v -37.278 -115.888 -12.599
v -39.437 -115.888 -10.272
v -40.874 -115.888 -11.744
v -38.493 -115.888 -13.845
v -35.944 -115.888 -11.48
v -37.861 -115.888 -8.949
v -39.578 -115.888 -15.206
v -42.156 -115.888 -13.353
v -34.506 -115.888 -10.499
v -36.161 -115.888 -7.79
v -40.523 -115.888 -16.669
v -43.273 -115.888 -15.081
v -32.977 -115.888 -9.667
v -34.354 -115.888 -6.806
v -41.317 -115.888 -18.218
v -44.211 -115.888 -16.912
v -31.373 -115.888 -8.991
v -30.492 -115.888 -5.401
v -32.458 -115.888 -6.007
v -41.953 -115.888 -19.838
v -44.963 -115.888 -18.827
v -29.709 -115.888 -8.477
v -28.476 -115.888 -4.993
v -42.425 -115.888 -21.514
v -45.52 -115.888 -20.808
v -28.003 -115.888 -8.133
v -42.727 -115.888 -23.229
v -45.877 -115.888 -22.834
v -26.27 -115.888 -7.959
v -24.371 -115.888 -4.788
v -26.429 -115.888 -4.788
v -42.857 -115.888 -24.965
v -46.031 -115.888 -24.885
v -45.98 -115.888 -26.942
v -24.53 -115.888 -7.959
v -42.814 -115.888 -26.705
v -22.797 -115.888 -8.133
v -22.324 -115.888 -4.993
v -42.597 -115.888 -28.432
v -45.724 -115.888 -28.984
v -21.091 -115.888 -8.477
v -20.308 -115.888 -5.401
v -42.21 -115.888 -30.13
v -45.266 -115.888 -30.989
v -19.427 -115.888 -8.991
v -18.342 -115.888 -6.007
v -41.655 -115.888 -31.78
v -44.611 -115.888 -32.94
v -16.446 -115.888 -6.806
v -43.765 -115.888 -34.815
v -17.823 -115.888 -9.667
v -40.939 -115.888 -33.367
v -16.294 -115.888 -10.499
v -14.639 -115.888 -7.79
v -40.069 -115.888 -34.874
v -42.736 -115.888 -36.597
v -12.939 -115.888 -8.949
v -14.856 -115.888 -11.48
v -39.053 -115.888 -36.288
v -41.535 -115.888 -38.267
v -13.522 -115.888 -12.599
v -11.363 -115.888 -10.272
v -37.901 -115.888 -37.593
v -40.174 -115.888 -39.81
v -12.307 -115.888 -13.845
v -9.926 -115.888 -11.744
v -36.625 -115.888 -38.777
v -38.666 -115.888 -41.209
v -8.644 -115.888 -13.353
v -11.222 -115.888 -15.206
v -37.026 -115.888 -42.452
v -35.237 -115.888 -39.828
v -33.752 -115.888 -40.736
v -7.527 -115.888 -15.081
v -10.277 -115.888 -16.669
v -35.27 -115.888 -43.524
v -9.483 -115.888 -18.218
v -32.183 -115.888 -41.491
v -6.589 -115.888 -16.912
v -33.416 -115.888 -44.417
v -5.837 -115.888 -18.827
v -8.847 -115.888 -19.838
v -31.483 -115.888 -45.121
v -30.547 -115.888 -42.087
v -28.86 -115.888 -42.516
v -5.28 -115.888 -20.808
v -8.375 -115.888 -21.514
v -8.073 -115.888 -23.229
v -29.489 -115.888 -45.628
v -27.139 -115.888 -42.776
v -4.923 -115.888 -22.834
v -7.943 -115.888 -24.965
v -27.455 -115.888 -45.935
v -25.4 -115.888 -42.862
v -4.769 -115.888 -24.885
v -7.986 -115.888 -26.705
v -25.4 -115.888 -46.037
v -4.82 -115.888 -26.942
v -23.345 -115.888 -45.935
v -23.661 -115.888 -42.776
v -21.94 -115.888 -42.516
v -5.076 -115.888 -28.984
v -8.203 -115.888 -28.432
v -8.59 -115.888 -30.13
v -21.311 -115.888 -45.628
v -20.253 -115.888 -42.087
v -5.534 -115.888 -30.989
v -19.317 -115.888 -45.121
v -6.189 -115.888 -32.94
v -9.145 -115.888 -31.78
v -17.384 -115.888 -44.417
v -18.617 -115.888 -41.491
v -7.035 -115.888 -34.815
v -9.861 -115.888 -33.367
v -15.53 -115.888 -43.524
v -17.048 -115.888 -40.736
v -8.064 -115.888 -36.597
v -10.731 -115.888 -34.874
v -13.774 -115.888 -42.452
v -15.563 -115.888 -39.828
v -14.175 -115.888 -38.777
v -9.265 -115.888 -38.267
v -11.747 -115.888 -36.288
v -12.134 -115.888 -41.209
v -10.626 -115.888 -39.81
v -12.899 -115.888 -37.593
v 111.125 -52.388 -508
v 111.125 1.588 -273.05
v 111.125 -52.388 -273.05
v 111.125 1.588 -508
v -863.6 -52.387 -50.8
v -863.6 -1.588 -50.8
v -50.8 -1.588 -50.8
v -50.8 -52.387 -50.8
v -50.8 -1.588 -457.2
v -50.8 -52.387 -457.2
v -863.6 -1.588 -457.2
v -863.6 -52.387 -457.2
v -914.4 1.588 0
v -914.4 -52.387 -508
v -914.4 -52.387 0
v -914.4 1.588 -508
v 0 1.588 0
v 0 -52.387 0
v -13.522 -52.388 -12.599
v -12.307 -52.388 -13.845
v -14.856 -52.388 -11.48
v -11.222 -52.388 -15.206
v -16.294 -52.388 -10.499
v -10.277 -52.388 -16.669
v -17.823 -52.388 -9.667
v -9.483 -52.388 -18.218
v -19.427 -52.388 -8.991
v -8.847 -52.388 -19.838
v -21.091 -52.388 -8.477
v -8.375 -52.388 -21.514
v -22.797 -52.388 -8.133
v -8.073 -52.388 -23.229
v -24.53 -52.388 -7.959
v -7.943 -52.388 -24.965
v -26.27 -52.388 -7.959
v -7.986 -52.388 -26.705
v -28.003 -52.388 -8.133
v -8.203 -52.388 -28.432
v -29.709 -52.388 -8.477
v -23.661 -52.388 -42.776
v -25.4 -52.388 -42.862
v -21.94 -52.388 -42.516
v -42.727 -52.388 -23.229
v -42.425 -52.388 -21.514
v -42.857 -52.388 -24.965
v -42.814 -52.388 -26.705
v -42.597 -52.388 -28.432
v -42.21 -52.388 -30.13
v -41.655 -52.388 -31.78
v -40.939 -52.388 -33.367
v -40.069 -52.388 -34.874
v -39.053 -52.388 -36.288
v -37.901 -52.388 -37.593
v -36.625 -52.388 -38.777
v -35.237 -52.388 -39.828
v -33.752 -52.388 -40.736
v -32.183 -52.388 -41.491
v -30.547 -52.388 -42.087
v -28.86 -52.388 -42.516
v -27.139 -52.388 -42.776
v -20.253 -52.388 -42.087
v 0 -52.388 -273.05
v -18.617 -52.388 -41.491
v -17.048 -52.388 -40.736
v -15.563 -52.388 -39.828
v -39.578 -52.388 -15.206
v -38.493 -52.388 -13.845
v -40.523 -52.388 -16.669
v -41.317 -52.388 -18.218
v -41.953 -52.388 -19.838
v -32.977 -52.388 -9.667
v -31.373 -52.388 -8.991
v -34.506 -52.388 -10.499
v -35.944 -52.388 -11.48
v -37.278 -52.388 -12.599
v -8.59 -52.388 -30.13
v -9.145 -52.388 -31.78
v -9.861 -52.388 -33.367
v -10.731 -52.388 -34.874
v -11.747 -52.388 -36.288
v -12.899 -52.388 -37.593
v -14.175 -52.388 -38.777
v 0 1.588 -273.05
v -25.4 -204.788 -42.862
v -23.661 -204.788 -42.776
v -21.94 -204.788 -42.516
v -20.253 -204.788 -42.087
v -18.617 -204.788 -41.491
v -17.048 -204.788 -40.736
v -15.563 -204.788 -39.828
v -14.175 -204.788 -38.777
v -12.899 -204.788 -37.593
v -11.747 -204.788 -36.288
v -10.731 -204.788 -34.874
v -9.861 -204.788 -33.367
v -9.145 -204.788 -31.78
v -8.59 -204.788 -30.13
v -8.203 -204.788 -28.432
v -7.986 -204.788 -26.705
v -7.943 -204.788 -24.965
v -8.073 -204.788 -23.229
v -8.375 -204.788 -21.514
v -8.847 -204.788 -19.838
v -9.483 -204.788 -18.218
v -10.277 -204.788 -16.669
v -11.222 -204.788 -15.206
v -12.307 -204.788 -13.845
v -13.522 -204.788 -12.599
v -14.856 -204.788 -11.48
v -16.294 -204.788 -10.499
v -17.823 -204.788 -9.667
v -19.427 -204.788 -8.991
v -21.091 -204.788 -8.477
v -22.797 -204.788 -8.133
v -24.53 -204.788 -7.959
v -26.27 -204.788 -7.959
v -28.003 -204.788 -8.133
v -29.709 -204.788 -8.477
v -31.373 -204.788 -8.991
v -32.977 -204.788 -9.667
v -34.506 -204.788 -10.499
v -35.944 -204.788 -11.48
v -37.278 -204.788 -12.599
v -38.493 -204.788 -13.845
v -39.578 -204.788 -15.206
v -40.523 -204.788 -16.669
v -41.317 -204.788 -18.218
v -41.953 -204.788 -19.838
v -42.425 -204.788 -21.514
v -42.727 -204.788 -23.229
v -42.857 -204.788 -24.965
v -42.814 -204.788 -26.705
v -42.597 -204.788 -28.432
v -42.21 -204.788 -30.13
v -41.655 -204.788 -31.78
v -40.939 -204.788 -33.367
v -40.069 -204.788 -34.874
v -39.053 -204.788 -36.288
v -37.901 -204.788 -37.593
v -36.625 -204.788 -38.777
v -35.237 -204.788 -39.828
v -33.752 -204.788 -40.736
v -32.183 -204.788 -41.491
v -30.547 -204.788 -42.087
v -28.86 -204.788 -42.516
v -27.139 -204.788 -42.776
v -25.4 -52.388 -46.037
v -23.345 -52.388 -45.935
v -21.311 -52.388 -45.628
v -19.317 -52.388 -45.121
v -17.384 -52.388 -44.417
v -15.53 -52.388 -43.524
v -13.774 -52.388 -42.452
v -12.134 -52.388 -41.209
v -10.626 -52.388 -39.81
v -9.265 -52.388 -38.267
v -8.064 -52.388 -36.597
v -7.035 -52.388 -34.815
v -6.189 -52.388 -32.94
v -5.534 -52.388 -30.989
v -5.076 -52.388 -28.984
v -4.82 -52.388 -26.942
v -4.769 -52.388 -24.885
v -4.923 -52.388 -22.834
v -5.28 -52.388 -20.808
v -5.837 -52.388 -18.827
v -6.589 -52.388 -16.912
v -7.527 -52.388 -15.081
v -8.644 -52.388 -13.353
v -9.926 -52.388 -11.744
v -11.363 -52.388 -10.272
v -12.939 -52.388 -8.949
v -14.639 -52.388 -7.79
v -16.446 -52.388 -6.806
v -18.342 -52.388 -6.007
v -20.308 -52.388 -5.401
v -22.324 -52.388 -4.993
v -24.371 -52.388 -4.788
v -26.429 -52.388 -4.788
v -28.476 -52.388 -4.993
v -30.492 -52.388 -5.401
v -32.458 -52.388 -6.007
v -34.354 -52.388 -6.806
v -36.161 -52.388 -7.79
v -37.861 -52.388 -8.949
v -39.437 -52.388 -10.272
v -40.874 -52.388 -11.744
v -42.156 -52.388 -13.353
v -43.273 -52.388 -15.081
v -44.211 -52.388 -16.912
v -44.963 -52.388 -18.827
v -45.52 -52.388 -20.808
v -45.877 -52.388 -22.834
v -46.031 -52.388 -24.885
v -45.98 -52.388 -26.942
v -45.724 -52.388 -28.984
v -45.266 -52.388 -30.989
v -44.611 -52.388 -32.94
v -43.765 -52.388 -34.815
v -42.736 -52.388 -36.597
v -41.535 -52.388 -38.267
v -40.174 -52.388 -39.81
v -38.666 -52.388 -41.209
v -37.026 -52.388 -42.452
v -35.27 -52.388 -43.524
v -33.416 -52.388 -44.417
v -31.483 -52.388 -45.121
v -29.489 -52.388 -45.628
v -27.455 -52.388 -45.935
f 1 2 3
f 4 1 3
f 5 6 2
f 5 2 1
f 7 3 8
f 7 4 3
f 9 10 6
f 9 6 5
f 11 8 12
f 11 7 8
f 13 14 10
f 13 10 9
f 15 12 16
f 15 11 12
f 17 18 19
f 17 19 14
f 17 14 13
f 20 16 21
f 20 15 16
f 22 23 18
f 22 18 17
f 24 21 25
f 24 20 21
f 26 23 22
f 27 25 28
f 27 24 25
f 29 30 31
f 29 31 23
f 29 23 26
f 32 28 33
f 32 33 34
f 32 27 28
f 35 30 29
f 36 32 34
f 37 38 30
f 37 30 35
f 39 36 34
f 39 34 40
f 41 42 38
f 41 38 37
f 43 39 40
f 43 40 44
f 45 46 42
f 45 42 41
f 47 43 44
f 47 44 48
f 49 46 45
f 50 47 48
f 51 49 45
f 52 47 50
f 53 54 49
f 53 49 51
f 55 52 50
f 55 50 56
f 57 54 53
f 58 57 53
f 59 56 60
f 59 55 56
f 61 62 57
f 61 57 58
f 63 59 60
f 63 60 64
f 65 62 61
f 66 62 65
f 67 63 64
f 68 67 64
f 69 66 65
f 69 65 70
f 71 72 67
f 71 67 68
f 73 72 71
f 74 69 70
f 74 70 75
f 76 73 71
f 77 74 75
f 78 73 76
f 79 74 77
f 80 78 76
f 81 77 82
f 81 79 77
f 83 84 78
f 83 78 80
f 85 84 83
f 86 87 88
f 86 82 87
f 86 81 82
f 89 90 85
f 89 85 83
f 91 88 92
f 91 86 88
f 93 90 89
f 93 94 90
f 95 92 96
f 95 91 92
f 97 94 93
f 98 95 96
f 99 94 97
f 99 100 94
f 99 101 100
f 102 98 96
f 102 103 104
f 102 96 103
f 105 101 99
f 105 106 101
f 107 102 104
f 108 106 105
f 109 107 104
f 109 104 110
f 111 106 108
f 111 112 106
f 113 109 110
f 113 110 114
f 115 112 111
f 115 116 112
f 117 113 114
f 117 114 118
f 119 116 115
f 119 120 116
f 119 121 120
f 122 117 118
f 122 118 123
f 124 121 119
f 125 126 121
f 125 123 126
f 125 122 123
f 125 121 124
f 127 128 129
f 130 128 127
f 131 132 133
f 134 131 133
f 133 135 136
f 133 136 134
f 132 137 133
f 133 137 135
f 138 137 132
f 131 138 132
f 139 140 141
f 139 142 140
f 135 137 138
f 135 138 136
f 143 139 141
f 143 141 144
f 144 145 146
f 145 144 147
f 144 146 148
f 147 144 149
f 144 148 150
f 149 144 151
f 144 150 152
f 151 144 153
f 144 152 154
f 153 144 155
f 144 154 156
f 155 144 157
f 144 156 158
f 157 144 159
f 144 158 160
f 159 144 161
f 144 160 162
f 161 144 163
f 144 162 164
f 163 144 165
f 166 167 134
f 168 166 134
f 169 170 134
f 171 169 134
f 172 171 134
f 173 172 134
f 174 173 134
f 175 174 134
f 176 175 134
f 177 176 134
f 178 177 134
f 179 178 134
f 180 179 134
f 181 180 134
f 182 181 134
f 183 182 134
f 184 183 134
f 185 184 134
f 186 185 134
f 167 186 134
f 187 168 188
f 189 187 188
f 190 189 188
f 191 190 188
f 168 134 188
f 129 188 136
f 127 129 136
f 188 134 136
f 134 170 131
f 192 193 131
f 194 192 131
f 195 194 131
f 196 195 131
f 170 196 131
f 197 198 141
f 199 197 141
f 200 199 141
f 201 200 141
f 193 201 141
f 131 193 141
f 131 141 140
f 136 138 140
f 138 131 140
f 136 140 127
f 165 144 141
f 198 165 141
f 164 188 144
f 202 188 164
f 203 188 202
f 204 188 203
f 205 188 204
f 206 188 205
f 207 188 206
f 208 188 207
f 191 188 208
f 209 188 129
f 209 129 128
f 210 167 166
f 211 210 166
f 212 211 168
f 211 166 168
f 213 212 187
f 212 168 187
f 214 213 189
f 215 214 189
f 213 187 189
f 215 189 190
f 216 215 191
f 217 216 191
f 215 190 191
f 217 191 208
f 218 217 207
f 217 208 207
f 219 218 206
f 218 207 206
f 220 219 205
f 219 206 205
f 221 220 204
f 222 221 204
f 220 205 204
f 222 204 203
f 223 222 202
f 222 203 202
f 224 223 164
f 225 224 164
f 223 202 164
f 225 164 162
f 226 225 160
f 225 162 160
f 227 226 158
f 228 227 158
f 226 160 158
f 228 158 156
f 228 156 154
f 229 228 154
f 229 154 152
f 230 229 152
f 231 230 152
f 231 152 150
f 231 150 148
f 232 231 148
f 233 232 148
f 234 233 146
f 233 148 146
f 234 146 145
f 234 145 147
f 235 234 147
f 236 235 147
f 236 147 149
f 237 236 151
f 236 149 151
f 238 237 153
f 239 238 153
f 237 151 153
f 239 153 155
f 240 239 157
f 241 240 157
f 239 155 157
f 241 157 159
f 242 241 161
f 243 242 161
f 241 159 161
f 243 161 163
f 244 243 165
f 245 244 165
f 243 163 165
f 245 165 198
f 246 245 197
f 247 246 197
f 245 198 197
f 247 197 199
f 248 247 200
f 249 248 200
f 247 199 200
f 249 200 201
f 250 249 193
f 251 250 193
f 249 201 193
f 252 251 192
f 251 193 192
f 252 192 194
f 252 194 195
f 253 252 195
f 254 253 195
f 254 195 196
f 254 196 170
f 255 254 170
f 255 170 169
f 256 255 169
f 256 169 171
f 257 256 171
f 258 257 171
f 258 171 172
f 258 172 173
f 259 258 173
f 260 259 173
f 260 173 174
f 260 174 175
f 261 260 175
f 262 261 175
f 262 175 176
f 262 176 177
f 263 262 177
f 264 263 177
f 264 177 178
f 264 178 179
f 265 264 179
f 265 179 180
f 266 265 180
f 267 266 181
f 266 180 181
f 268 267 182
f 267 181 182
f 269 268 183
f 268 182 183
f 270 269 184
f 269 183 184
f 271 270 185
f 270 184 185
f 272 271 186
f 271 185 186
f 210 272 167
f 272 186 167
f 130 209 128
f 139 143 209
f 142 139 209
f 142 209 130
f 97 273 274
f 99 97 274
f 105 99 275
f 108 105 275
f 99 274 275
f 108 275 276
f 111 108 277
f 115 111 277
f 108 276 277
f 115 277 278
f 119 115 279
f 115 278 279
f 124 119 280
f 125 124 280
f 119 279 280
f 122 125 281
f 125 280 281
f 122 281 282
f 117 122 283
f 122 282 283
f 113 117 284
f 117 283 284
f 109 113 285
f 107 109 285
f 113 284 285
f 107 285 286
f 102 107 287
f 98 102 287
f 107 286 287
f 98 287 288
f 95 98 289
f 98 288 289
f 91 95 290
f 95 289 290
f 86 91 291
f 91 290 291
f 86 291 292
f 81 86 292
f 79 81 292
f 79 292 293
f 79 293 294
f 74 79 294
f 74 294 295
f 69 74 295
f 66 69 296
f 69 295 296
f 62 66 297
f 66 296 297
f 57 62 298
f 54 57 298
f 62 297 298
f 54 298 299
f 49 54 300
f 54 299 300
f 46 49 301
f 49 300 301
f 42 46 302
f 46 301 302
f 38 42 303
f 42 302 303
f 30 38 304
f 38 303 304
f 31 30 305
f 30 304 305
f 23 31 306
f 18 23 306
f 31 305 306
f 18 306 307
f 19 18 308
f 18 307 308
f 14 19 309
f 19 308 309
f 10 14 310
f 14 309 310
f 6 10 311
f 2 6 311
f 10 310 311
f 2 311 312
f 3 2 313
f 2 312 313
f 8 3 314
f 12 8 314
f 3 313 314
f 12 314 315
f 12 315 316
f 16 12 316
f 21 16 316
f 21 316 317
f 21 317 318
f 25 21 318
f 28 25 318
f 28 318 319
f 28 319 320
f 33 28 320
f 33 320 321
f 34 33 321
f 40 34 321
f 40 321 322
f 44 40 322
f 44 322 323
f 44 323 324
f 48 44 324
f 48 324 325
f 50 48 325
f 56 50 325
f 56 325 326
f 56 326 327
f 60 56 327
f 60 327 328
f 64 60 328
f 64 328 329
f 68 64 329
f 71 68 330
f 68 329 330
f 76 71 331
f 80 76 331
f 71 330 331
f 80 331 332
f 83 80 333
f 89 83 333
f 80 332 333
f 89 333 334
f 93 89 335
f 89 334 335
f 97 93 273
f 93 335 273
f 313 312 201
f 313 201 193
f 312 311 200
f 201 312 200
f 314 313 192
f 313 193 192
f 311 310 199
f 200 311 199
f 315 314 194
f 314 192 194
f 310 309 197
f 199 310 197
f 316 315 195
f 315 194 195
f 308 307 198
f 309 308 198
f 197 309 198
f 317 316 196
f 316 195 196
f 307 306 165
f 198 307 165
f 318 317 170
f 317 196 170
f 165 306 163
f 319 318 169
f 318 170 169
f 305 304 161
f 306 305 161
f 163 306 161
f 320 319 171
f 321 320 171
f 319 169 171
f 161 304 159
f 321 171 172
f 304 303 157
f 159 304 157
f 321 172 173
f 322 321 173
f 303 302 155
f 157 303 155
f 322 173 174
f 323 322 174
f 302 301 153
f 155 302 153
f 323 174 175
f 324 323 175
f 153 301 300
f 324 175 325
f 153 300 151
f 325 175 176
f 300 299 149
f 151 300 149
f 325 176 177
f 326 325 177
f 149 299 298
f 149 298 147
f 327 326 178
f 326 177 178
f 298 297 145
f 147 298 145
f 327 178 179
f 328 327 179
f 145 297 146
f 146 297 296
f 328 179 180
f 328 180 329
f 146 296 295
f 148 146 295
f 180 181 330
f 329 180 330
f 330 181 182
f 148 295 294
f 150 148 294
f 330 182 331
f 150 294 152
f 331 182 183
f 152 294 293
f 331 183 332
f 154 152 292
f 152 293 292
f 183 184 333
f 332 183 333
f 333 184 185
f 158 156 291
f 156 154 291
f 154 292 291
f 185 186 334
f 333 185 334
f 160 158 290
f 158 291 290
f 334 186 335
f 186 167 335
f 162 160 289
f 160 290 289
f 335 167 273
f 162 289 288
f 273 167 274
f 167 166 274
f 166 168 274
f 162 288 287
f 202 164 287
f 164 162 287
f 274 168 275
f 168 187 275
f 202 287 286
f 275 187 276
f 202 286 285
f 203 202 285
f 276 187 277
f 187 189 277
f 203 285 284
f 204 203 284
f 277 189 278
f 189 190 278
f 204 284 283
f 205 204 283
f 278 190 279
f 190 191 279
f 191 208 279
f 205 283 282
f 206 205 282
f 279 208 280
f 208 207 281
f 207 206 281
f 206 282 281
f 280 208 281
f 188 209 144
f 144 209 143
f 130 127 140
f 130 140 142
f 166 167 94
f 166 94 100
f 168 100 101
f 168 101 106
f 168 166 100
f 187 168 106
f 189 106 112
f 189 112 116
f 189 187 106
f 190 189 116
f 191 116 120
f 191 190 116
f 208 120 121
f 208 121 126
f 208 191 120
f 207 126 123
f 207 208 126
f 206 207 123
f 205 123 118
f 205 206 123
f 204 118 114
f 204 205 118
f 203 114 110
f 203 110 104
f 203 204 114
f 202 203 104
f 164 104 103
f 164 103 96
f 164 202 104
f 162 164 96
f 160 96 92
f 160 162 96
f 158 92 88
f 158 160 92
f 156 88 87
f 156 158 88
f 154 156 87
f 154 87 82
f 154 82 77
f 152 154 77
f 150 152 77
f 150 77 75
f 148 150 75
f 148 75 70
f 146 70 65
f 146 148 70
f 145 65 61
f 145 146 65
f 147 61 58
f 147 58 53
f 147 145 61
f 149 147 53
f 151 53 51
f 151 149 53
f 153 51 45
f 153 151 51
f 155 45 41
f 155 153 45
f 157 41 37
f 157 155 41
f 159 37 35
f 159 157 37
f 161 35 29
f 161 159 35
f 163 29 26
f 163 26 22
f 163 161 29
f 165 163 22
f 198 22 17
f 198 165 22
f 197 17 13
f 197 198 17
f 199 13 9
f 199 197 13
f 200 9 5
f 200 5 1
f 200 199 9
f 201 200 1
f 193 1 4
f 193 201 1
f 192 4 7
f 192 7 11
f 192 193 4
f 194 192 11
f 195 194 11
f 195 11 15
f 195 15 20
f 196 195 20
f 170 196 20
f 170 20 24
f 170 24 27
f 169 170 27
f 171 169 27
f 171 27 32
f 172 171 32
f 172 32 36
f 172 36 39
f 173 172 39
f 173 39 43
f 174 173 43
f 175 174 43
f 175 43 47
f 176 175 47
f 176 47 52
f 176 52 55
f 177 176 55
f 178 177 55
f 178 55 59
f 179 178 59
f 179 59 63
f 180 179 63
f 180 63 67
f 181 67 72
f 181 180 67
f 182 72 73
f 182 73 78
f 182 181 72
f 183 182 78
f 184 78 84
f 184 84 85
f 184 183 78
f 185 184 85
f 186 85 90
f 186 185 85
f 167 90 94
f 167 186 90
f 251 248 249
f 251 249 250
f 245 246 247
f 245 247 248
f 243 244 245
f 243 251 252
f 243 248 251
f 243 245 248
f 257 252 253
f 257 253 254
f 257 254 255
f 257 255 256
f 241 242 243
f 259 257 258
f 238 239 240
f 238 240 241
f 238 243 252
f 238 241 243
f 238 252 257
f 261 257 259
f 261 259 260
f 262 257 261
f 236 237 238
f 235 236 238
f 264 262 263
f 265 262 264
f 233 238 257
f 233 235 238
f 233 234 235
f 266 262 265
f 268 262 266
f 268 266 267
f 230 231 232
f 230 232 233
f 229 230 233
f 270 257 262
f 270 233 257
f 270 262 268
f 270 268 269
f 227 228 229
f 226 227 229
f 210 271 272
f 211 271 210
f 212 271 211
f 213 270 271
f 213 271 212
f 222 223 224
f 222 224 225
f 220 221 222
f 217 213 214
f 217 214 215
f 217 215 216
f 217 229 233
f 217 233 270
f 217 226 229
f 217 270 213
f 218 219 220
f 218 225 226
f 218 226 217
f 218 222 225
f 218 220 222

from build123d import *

# Parameters (mm, degrees)
SKETCH1_W           = 914.4
SKETCH1_H           = 508
BOSS_EXTRUDE1_DEPTH = 1.5875
SKETCH2_W           = 914.4
SKETCH2_H           = 508
SKETCH2_W_2         = 812.8
SKETCH2_H_2         = 406.4
BOSS_EXTRUDE2_DEPTH = 50.8
SKETCH3_R           = 17.4625
BOSS_EXTRUDE3_DEPTH = 152.4
SKETCH4_R           = 20.6375
SKETCH4_R_2         = 17.4625
BOSS_EXTRUDE4_DEPTH = 63.5
SKETCH5_W           = 234.95
SKETCH5_H           = 53.975
BOSS_EXTRUDE5_DEPTH = 111.125


with BuildPart() as part:
    # Sketch1 → Boss-Extrude1 (new body, symmetric)
    with BuildSketch(Plane(origin=(0, 0, 0), x_dir=(1, 0, 0), z_dir=(0, 1, 0))):
        with Locations((-457.2, 254)):
            Rectangle(SKETCH1_W, SKETCH1_H)
    extrude(amount=BOSS_EXTRUDE1_DEPTH, both=True)

    # Sketch2 → Boss-Extrude2 (add)
    with BuildSketch(Plane.XZ.offset(1.5875)):
        with Locations((-457.2, -254)):
            Rectangle(SKETCH2_W, SKETCH2_H)
        with Locations((-457.2, -254)):
            Rectangle(SKETCH2_W_2, SKETCH2_H_2, mode=Mode.SUBTRACT)
    extrude(amount=BOSS_EXTRUDE2_DEPTH)

    # Sketch3 → Boss-Extrude3 (add)
    with BuildSketch(Plane.XZ.offset(52.3875)):
        with Locations(Location((-25.4, -25.4, 0), (0, 0, 270))):  # turned: the seam where the file's is
            Circle(SKETCH3_R)
    extrude(amount=BOSS_EXTRUDE3_DEPTH)

    # Sketch5 → Boss-Extrude5 (add)
    with BuildSketch(Plane(origin=(0, 0, 0), x_dir=(0, 0, -1), z_dir=(1, 0, 0))):
        with Locations((390.525, -25.4)):
            Rectangle(SKETCH5_W, SKETCH5_H)
    extrude(amount=BOSS_EXTRUDE5_DEPTH)


with BuildPart() as body_2:
    # Sketch4 → Boss-Extrude4 (new body)
    with BuildSketch(Plane.XZ.offset(52.3875)):
        with Locations(Location((-25.4, -25.4, 0), (0, 0, 270))):  # turned: the seam where the file's is
            Circle(SKETCH4_R)
        with Locations(Location((-25.4, -25.4, 0), (0, 0, 270))):  # turned: the seam where the file's is
            Circle(SKETCH4_R_2, mode=Mode.SUBTRACT)
    extrude(amount=BOSS_EXTRUDE4_DEPTH)


solid = Compound([part.part, body_2.part])
